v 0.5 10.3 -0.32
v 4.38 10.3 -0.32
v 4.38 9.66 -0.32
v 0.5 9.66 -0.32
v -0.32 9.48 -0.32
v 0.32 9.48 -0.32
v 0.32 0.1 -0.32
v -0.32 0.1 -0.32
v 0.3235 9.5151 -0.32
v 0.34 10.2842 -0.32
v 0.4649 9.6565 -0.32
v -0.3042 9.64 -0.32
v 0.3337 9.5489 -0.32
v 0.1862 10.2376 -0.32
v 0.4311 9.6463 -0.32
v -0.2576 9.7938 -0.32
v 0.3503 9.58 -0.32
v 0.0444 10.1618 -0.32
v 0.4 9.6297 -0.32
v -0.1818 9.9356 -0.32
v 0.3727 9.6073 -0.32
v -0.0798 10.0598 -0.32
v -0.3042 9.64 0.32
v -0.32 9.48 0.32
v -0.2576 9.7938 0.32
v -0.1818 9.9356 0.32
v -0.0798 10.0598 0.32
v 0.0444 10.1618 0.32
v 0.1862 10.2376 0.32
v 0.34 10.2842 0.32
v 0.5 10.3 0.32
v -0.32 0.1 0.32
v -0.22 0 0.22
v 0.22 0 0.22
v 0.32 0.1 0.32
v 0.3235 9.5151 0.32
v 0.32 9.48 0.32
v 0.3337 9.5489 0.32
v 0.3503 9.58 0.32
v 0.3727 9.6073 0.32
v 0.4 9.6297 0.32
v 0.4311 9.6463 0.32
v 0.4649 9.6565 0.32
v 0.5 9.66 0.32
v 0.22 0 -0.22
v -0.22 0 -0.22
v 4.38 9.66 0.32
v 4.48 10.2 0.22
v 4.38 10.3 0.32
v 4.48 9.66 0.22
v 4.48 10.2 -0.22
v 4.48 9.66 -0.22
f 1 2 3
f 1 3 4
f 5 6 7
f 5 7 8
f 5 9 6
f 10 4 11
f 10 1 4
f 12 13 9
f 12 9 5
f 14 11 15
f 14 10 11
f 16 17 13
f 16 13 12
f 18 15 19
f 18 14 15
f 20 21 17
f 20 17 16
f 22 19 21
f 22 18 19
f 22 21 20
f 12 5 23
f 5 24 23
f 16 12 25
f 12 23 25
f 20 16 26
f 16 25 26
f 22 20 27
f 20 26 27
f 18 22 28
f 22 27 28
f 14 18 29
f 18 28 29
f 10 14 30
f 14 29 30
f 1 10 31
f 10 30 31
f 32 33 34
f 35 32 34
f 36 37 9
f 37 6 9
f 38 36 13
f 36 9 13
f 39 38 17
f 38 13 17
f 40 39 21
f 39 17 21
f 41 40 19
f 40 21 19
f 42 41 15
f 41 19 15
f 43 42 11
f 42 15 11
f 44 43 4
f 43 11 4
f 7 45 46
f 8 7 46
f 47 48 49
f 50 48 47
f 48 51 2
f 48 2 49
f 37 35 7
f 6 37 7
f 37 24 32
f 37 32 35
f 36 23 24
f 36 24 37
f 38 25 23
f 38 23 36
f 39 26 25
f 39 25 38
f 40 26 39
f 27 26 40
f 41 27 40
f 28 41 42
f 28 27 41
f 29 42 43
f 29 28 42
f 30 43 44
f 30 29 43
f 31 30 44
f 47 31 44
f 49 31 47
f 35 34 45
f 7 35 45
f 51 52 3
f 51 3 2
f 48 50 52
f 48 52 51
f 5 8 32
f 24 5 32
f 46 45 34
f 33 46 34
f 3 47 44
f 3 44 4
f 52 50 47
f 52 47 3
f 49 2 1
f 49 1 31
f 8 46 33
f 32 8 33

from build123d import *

# Parameters (mm, degrees)
SKETCH_1_W     = 0.64
SKETCH_1_H     = 0.64
CHAMFER_1_SIZE = 0.1


with BuildPart() as part:
    # По траектории1: sweep along a path in Эскиз2
    with BuildLine(Plane.XY) as sweep_1_path:
        Line((0, 0), (0, 9.48))
        ThreePointArc((0, 9.48), (0.146446609, 9.833553391), (0.5, 9.98))
        Line((0.5, 9.98), (4.48, 9.98))
    # Эскиз1 → По траектории1 (sweep)
    with BuildSketch(Plane(origin=(0, 0, 0), x_dir=(1, 0, 0), z_dir=(0, 1, 0))):
        Rectangle(SKETCH_1_W, SKETCH_1_H)
    sweep(path=sweep_1_path.line)

    # Фаска1
    chamfer_1_edges = [part.edges().sort_by_distance(p)[0] for p in [
        (4.48, 9.98, 0.32),
        (4.48, 10.3, 0),
        (4.48, 9.98, -0.32),
        (0, 0, 0.32),
        (-0.32, 0, 0),
        (0, 0, -0.32),
        (0.32, 0, 0),
    ]]
    chamfer(chamfer_1_edges, length=CHAMFER_1_SIZE)


solid = part.part
